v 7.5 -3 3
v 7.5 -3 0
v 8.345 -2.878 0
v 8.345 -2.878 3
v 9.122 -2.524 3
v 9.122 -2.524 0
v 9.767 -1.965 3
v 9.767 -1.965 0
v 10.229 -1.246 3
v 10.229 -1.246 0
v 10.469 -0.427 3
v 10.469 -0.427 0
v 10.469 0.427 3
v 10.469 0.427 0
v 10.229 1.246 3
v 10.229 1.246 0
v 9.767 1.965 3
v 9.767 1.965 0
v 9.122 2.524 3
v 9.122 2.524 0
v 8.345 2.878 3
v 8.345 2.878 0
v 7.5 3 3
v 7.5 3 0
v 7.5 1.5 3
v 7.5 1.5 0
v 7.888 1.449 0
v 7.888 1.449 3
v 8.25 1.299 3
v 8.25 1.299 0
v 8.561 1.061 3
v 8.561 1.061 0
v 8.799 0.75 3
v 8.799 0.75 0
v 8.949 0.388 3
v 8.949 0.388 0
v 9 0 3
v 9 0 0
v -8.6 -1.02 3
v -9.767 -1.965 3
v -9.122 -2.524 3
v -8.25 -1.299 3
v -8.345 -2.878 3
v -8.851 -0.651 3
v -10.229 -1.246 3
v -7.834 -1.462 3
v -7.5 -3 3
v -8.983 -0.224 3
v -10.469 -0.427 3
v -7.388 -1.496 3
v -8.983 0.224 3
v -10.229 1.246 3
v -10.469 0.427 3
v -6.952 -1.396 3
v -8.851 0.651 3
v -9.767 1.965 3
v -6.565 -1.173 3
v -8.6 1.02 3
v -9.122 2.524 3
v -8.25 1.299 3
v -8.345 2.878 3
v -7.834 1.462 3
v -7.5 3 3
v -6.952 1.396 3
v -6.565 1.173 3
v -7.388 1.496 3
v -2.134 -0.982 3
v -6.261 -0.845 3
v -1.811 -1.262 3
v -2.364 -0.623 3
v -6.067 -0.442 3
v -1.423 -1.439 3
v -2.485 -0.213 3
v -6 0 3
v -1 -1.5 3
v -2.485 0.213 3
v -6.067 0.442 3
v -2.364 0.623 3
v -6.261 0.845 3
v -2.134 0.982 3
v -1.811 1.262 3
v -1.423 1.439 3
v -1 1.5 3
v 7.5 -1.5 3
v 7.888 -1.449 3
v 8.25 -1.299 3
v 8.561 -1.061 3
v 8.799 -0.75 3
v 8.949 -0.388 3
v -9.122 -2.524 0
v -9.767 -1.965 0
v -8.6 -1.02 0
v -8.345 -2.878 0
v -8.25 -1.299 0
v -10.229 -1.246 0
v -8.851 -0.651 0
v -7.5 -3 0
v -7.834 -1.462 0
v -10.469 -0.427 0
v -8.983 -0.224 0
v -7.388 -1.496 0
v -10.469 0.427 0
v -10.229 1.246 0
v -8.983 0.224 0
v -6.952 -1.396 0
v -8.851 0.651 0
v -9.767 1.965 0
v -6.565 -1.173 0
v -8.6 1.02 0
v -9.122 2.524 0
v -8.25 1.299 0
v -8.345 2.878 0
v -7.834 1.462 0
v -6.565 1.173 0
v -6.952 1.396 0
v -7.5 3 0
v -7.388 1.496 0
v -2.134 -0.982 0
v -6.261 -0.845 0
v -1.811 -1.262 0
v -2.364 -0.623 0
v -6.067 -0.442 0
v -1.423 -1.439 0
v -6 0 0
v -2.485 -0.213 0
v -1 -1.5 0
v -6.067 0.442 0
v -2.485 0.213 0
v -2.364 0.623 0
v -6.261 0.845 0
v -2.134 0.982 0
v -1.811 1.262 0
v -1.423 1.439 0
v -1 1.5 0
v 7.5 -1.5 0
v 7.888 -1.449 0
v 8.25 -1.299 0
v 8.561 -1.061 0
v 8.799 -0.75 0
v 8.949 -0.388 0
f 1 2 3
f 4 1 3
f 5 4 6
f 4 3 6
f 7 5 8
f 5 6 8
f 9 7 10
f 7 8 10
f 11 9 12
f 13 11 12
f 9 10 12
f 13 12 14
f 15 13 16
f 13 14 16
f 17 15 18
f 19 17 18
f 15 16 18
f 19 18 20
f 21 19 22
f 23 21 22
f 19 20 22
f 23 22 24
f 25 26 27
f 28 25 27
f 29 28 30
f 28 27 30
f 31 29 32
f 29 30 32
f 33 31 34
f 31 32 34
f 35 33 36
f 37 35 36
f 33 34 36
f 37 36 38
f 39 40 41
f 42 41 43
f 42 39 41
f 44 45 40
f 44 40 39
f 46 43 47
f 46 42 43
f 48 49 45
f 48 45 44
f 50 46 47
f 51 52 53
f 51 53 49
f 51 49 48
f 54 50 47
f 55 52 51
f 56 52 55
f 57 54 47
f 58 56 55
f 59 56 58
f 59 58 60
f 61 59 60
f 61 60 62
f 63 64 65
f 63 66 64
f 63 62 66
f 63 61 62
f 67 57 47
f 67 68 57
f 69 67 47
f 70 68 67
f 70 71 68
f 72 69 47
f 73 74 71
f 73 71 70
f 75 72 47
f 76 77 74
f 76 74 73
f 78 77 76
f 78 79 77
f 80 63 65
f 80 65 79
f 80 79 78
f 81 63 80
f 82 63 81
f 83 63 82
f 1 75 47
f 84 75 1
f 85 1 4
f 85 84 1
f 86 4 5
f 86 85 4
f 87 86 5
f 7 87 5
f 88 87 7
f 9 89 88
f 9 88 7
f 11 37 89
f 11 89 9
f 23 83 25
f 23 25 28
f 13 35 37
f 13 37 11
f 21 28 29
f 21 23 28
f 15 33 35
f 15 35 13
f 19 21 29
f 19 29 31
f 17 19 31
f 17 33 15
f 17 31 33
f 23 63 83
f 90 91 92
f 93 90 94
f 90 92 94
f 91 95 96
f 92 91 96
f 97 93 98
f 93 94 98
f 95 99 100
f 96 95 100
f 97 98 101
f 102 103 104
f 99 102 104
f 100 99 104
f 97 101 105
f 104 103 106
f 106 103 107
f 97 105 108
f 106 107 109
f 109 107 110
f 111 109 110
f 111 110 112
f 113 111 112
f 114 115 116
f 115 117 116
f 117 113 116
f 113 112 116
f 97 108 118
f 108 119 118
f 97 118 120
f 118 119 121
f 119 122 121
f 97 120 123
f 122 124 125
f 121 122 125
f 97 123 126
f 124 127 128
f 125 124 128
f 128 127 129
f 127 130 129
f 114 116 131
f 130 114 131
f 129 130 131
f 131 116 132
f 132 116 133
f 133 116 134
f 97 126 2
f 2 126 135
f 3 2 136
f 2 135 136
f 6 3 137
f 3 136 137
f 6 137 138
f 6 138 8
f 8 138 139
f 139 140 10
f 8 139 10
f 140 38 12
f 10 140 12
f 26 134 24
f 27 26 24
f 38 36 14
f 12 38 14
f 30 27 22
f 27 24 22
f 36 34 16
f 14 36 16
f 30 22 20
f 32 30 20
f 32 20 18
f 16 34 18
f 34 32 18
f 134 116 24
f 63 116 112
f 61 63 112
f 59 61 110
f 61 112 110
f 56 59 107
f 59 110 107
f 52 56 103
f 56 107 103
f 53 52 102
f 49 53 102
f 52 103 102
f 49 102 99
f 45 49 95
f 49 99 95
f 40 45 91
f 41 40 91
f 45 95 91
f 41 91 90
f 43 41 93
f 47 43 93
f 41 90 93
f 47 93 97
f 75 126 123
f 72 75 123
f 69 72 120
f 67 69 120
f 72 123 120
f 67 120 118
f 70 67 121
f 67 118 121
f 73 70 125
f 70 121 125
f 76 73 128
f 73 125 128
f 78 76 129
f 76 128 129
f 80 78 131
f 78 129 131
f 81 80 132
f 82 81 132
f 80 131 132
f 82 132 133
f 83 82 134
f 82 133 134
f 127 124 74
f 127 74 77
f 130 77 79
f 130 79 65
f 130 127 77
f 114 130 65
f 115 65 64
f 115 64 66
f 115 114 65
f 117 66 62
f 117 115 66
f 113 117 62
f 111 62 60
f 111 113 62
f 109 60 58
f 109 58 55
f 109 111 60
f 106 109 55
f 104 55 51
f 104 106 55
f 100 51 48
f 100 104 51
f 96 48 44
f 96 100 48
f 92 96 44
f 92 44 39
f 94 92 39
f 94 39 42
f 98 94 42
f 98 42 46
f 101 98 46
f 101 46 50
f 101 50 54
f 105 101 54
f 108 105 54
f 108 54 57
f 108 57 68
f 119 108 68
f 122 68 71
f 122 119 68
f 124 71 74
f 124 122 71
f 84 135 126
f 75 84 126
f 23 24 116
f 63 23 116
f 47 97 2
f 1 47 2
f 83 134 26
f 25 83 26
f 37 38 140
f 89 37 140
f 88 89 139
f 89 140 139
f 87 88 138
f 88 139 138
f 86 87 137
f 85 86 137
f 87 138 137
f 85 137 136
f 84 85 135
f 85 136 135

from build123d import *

# Parameters (mm, degrees)
F0_R     = 1.5
F1_DEPTH = 3


with BuildPart() as f1:
    # F0 (on Top) → F1 (new body)
    with BuildSketch(Plane.XY):
        with BuildLine():
            Line((7.5, 3), (0, 3))
            Line((0, 3), (-7.5, 3))
            ThreePointArc((-7.5, 3), (-5.37868, 2.12132), (-4.5, 0))
            ThreePointArc((-4.5, 0), (-5.37868, -2.12132), (-7.5, -3))
            Line((-7.5, -3), (0, -3))
            Line((0, -3), (7.5, -3))
            ThreePointArc((7.5, -3), (10.5, 0), (7.5, 3))
        make_face()
        with BuildLine():
            ThreePointArc((-1, -1.5), (-2.5, 0), (-1, 1.5))
            Line((-1, 1.5), (7.5, 1.5))
            ThreePointArc((7.5, 1.5), (8.56066, 1.06066), (9, 0))
            ThreePointArc((9, 0), (8.56066, -1.06066), (7.5, -1.5))
            Line((7.5, -1.5), (-1, -1.5))
        make_face(mode=Mode.SUBTRACT)
        with BuildLine():
            ThreePointArc((-4.5, 0), (-5.37868, 2.12132), (-7.5, 3))
            ThreePointArc((-7.5, 3), (-10.5, 0), (-7.5, -3))
            ThreePointArc((-7.5, -3), (-5.37868, -2.12132), (-4.5, 0))
        make_face()
        with Locations((-7.5, 0)):
            Circle(F0_R, mode=Mode.SUBTRACT)
    extrude(amount=F1_DEPTH)


solid = f1.part
